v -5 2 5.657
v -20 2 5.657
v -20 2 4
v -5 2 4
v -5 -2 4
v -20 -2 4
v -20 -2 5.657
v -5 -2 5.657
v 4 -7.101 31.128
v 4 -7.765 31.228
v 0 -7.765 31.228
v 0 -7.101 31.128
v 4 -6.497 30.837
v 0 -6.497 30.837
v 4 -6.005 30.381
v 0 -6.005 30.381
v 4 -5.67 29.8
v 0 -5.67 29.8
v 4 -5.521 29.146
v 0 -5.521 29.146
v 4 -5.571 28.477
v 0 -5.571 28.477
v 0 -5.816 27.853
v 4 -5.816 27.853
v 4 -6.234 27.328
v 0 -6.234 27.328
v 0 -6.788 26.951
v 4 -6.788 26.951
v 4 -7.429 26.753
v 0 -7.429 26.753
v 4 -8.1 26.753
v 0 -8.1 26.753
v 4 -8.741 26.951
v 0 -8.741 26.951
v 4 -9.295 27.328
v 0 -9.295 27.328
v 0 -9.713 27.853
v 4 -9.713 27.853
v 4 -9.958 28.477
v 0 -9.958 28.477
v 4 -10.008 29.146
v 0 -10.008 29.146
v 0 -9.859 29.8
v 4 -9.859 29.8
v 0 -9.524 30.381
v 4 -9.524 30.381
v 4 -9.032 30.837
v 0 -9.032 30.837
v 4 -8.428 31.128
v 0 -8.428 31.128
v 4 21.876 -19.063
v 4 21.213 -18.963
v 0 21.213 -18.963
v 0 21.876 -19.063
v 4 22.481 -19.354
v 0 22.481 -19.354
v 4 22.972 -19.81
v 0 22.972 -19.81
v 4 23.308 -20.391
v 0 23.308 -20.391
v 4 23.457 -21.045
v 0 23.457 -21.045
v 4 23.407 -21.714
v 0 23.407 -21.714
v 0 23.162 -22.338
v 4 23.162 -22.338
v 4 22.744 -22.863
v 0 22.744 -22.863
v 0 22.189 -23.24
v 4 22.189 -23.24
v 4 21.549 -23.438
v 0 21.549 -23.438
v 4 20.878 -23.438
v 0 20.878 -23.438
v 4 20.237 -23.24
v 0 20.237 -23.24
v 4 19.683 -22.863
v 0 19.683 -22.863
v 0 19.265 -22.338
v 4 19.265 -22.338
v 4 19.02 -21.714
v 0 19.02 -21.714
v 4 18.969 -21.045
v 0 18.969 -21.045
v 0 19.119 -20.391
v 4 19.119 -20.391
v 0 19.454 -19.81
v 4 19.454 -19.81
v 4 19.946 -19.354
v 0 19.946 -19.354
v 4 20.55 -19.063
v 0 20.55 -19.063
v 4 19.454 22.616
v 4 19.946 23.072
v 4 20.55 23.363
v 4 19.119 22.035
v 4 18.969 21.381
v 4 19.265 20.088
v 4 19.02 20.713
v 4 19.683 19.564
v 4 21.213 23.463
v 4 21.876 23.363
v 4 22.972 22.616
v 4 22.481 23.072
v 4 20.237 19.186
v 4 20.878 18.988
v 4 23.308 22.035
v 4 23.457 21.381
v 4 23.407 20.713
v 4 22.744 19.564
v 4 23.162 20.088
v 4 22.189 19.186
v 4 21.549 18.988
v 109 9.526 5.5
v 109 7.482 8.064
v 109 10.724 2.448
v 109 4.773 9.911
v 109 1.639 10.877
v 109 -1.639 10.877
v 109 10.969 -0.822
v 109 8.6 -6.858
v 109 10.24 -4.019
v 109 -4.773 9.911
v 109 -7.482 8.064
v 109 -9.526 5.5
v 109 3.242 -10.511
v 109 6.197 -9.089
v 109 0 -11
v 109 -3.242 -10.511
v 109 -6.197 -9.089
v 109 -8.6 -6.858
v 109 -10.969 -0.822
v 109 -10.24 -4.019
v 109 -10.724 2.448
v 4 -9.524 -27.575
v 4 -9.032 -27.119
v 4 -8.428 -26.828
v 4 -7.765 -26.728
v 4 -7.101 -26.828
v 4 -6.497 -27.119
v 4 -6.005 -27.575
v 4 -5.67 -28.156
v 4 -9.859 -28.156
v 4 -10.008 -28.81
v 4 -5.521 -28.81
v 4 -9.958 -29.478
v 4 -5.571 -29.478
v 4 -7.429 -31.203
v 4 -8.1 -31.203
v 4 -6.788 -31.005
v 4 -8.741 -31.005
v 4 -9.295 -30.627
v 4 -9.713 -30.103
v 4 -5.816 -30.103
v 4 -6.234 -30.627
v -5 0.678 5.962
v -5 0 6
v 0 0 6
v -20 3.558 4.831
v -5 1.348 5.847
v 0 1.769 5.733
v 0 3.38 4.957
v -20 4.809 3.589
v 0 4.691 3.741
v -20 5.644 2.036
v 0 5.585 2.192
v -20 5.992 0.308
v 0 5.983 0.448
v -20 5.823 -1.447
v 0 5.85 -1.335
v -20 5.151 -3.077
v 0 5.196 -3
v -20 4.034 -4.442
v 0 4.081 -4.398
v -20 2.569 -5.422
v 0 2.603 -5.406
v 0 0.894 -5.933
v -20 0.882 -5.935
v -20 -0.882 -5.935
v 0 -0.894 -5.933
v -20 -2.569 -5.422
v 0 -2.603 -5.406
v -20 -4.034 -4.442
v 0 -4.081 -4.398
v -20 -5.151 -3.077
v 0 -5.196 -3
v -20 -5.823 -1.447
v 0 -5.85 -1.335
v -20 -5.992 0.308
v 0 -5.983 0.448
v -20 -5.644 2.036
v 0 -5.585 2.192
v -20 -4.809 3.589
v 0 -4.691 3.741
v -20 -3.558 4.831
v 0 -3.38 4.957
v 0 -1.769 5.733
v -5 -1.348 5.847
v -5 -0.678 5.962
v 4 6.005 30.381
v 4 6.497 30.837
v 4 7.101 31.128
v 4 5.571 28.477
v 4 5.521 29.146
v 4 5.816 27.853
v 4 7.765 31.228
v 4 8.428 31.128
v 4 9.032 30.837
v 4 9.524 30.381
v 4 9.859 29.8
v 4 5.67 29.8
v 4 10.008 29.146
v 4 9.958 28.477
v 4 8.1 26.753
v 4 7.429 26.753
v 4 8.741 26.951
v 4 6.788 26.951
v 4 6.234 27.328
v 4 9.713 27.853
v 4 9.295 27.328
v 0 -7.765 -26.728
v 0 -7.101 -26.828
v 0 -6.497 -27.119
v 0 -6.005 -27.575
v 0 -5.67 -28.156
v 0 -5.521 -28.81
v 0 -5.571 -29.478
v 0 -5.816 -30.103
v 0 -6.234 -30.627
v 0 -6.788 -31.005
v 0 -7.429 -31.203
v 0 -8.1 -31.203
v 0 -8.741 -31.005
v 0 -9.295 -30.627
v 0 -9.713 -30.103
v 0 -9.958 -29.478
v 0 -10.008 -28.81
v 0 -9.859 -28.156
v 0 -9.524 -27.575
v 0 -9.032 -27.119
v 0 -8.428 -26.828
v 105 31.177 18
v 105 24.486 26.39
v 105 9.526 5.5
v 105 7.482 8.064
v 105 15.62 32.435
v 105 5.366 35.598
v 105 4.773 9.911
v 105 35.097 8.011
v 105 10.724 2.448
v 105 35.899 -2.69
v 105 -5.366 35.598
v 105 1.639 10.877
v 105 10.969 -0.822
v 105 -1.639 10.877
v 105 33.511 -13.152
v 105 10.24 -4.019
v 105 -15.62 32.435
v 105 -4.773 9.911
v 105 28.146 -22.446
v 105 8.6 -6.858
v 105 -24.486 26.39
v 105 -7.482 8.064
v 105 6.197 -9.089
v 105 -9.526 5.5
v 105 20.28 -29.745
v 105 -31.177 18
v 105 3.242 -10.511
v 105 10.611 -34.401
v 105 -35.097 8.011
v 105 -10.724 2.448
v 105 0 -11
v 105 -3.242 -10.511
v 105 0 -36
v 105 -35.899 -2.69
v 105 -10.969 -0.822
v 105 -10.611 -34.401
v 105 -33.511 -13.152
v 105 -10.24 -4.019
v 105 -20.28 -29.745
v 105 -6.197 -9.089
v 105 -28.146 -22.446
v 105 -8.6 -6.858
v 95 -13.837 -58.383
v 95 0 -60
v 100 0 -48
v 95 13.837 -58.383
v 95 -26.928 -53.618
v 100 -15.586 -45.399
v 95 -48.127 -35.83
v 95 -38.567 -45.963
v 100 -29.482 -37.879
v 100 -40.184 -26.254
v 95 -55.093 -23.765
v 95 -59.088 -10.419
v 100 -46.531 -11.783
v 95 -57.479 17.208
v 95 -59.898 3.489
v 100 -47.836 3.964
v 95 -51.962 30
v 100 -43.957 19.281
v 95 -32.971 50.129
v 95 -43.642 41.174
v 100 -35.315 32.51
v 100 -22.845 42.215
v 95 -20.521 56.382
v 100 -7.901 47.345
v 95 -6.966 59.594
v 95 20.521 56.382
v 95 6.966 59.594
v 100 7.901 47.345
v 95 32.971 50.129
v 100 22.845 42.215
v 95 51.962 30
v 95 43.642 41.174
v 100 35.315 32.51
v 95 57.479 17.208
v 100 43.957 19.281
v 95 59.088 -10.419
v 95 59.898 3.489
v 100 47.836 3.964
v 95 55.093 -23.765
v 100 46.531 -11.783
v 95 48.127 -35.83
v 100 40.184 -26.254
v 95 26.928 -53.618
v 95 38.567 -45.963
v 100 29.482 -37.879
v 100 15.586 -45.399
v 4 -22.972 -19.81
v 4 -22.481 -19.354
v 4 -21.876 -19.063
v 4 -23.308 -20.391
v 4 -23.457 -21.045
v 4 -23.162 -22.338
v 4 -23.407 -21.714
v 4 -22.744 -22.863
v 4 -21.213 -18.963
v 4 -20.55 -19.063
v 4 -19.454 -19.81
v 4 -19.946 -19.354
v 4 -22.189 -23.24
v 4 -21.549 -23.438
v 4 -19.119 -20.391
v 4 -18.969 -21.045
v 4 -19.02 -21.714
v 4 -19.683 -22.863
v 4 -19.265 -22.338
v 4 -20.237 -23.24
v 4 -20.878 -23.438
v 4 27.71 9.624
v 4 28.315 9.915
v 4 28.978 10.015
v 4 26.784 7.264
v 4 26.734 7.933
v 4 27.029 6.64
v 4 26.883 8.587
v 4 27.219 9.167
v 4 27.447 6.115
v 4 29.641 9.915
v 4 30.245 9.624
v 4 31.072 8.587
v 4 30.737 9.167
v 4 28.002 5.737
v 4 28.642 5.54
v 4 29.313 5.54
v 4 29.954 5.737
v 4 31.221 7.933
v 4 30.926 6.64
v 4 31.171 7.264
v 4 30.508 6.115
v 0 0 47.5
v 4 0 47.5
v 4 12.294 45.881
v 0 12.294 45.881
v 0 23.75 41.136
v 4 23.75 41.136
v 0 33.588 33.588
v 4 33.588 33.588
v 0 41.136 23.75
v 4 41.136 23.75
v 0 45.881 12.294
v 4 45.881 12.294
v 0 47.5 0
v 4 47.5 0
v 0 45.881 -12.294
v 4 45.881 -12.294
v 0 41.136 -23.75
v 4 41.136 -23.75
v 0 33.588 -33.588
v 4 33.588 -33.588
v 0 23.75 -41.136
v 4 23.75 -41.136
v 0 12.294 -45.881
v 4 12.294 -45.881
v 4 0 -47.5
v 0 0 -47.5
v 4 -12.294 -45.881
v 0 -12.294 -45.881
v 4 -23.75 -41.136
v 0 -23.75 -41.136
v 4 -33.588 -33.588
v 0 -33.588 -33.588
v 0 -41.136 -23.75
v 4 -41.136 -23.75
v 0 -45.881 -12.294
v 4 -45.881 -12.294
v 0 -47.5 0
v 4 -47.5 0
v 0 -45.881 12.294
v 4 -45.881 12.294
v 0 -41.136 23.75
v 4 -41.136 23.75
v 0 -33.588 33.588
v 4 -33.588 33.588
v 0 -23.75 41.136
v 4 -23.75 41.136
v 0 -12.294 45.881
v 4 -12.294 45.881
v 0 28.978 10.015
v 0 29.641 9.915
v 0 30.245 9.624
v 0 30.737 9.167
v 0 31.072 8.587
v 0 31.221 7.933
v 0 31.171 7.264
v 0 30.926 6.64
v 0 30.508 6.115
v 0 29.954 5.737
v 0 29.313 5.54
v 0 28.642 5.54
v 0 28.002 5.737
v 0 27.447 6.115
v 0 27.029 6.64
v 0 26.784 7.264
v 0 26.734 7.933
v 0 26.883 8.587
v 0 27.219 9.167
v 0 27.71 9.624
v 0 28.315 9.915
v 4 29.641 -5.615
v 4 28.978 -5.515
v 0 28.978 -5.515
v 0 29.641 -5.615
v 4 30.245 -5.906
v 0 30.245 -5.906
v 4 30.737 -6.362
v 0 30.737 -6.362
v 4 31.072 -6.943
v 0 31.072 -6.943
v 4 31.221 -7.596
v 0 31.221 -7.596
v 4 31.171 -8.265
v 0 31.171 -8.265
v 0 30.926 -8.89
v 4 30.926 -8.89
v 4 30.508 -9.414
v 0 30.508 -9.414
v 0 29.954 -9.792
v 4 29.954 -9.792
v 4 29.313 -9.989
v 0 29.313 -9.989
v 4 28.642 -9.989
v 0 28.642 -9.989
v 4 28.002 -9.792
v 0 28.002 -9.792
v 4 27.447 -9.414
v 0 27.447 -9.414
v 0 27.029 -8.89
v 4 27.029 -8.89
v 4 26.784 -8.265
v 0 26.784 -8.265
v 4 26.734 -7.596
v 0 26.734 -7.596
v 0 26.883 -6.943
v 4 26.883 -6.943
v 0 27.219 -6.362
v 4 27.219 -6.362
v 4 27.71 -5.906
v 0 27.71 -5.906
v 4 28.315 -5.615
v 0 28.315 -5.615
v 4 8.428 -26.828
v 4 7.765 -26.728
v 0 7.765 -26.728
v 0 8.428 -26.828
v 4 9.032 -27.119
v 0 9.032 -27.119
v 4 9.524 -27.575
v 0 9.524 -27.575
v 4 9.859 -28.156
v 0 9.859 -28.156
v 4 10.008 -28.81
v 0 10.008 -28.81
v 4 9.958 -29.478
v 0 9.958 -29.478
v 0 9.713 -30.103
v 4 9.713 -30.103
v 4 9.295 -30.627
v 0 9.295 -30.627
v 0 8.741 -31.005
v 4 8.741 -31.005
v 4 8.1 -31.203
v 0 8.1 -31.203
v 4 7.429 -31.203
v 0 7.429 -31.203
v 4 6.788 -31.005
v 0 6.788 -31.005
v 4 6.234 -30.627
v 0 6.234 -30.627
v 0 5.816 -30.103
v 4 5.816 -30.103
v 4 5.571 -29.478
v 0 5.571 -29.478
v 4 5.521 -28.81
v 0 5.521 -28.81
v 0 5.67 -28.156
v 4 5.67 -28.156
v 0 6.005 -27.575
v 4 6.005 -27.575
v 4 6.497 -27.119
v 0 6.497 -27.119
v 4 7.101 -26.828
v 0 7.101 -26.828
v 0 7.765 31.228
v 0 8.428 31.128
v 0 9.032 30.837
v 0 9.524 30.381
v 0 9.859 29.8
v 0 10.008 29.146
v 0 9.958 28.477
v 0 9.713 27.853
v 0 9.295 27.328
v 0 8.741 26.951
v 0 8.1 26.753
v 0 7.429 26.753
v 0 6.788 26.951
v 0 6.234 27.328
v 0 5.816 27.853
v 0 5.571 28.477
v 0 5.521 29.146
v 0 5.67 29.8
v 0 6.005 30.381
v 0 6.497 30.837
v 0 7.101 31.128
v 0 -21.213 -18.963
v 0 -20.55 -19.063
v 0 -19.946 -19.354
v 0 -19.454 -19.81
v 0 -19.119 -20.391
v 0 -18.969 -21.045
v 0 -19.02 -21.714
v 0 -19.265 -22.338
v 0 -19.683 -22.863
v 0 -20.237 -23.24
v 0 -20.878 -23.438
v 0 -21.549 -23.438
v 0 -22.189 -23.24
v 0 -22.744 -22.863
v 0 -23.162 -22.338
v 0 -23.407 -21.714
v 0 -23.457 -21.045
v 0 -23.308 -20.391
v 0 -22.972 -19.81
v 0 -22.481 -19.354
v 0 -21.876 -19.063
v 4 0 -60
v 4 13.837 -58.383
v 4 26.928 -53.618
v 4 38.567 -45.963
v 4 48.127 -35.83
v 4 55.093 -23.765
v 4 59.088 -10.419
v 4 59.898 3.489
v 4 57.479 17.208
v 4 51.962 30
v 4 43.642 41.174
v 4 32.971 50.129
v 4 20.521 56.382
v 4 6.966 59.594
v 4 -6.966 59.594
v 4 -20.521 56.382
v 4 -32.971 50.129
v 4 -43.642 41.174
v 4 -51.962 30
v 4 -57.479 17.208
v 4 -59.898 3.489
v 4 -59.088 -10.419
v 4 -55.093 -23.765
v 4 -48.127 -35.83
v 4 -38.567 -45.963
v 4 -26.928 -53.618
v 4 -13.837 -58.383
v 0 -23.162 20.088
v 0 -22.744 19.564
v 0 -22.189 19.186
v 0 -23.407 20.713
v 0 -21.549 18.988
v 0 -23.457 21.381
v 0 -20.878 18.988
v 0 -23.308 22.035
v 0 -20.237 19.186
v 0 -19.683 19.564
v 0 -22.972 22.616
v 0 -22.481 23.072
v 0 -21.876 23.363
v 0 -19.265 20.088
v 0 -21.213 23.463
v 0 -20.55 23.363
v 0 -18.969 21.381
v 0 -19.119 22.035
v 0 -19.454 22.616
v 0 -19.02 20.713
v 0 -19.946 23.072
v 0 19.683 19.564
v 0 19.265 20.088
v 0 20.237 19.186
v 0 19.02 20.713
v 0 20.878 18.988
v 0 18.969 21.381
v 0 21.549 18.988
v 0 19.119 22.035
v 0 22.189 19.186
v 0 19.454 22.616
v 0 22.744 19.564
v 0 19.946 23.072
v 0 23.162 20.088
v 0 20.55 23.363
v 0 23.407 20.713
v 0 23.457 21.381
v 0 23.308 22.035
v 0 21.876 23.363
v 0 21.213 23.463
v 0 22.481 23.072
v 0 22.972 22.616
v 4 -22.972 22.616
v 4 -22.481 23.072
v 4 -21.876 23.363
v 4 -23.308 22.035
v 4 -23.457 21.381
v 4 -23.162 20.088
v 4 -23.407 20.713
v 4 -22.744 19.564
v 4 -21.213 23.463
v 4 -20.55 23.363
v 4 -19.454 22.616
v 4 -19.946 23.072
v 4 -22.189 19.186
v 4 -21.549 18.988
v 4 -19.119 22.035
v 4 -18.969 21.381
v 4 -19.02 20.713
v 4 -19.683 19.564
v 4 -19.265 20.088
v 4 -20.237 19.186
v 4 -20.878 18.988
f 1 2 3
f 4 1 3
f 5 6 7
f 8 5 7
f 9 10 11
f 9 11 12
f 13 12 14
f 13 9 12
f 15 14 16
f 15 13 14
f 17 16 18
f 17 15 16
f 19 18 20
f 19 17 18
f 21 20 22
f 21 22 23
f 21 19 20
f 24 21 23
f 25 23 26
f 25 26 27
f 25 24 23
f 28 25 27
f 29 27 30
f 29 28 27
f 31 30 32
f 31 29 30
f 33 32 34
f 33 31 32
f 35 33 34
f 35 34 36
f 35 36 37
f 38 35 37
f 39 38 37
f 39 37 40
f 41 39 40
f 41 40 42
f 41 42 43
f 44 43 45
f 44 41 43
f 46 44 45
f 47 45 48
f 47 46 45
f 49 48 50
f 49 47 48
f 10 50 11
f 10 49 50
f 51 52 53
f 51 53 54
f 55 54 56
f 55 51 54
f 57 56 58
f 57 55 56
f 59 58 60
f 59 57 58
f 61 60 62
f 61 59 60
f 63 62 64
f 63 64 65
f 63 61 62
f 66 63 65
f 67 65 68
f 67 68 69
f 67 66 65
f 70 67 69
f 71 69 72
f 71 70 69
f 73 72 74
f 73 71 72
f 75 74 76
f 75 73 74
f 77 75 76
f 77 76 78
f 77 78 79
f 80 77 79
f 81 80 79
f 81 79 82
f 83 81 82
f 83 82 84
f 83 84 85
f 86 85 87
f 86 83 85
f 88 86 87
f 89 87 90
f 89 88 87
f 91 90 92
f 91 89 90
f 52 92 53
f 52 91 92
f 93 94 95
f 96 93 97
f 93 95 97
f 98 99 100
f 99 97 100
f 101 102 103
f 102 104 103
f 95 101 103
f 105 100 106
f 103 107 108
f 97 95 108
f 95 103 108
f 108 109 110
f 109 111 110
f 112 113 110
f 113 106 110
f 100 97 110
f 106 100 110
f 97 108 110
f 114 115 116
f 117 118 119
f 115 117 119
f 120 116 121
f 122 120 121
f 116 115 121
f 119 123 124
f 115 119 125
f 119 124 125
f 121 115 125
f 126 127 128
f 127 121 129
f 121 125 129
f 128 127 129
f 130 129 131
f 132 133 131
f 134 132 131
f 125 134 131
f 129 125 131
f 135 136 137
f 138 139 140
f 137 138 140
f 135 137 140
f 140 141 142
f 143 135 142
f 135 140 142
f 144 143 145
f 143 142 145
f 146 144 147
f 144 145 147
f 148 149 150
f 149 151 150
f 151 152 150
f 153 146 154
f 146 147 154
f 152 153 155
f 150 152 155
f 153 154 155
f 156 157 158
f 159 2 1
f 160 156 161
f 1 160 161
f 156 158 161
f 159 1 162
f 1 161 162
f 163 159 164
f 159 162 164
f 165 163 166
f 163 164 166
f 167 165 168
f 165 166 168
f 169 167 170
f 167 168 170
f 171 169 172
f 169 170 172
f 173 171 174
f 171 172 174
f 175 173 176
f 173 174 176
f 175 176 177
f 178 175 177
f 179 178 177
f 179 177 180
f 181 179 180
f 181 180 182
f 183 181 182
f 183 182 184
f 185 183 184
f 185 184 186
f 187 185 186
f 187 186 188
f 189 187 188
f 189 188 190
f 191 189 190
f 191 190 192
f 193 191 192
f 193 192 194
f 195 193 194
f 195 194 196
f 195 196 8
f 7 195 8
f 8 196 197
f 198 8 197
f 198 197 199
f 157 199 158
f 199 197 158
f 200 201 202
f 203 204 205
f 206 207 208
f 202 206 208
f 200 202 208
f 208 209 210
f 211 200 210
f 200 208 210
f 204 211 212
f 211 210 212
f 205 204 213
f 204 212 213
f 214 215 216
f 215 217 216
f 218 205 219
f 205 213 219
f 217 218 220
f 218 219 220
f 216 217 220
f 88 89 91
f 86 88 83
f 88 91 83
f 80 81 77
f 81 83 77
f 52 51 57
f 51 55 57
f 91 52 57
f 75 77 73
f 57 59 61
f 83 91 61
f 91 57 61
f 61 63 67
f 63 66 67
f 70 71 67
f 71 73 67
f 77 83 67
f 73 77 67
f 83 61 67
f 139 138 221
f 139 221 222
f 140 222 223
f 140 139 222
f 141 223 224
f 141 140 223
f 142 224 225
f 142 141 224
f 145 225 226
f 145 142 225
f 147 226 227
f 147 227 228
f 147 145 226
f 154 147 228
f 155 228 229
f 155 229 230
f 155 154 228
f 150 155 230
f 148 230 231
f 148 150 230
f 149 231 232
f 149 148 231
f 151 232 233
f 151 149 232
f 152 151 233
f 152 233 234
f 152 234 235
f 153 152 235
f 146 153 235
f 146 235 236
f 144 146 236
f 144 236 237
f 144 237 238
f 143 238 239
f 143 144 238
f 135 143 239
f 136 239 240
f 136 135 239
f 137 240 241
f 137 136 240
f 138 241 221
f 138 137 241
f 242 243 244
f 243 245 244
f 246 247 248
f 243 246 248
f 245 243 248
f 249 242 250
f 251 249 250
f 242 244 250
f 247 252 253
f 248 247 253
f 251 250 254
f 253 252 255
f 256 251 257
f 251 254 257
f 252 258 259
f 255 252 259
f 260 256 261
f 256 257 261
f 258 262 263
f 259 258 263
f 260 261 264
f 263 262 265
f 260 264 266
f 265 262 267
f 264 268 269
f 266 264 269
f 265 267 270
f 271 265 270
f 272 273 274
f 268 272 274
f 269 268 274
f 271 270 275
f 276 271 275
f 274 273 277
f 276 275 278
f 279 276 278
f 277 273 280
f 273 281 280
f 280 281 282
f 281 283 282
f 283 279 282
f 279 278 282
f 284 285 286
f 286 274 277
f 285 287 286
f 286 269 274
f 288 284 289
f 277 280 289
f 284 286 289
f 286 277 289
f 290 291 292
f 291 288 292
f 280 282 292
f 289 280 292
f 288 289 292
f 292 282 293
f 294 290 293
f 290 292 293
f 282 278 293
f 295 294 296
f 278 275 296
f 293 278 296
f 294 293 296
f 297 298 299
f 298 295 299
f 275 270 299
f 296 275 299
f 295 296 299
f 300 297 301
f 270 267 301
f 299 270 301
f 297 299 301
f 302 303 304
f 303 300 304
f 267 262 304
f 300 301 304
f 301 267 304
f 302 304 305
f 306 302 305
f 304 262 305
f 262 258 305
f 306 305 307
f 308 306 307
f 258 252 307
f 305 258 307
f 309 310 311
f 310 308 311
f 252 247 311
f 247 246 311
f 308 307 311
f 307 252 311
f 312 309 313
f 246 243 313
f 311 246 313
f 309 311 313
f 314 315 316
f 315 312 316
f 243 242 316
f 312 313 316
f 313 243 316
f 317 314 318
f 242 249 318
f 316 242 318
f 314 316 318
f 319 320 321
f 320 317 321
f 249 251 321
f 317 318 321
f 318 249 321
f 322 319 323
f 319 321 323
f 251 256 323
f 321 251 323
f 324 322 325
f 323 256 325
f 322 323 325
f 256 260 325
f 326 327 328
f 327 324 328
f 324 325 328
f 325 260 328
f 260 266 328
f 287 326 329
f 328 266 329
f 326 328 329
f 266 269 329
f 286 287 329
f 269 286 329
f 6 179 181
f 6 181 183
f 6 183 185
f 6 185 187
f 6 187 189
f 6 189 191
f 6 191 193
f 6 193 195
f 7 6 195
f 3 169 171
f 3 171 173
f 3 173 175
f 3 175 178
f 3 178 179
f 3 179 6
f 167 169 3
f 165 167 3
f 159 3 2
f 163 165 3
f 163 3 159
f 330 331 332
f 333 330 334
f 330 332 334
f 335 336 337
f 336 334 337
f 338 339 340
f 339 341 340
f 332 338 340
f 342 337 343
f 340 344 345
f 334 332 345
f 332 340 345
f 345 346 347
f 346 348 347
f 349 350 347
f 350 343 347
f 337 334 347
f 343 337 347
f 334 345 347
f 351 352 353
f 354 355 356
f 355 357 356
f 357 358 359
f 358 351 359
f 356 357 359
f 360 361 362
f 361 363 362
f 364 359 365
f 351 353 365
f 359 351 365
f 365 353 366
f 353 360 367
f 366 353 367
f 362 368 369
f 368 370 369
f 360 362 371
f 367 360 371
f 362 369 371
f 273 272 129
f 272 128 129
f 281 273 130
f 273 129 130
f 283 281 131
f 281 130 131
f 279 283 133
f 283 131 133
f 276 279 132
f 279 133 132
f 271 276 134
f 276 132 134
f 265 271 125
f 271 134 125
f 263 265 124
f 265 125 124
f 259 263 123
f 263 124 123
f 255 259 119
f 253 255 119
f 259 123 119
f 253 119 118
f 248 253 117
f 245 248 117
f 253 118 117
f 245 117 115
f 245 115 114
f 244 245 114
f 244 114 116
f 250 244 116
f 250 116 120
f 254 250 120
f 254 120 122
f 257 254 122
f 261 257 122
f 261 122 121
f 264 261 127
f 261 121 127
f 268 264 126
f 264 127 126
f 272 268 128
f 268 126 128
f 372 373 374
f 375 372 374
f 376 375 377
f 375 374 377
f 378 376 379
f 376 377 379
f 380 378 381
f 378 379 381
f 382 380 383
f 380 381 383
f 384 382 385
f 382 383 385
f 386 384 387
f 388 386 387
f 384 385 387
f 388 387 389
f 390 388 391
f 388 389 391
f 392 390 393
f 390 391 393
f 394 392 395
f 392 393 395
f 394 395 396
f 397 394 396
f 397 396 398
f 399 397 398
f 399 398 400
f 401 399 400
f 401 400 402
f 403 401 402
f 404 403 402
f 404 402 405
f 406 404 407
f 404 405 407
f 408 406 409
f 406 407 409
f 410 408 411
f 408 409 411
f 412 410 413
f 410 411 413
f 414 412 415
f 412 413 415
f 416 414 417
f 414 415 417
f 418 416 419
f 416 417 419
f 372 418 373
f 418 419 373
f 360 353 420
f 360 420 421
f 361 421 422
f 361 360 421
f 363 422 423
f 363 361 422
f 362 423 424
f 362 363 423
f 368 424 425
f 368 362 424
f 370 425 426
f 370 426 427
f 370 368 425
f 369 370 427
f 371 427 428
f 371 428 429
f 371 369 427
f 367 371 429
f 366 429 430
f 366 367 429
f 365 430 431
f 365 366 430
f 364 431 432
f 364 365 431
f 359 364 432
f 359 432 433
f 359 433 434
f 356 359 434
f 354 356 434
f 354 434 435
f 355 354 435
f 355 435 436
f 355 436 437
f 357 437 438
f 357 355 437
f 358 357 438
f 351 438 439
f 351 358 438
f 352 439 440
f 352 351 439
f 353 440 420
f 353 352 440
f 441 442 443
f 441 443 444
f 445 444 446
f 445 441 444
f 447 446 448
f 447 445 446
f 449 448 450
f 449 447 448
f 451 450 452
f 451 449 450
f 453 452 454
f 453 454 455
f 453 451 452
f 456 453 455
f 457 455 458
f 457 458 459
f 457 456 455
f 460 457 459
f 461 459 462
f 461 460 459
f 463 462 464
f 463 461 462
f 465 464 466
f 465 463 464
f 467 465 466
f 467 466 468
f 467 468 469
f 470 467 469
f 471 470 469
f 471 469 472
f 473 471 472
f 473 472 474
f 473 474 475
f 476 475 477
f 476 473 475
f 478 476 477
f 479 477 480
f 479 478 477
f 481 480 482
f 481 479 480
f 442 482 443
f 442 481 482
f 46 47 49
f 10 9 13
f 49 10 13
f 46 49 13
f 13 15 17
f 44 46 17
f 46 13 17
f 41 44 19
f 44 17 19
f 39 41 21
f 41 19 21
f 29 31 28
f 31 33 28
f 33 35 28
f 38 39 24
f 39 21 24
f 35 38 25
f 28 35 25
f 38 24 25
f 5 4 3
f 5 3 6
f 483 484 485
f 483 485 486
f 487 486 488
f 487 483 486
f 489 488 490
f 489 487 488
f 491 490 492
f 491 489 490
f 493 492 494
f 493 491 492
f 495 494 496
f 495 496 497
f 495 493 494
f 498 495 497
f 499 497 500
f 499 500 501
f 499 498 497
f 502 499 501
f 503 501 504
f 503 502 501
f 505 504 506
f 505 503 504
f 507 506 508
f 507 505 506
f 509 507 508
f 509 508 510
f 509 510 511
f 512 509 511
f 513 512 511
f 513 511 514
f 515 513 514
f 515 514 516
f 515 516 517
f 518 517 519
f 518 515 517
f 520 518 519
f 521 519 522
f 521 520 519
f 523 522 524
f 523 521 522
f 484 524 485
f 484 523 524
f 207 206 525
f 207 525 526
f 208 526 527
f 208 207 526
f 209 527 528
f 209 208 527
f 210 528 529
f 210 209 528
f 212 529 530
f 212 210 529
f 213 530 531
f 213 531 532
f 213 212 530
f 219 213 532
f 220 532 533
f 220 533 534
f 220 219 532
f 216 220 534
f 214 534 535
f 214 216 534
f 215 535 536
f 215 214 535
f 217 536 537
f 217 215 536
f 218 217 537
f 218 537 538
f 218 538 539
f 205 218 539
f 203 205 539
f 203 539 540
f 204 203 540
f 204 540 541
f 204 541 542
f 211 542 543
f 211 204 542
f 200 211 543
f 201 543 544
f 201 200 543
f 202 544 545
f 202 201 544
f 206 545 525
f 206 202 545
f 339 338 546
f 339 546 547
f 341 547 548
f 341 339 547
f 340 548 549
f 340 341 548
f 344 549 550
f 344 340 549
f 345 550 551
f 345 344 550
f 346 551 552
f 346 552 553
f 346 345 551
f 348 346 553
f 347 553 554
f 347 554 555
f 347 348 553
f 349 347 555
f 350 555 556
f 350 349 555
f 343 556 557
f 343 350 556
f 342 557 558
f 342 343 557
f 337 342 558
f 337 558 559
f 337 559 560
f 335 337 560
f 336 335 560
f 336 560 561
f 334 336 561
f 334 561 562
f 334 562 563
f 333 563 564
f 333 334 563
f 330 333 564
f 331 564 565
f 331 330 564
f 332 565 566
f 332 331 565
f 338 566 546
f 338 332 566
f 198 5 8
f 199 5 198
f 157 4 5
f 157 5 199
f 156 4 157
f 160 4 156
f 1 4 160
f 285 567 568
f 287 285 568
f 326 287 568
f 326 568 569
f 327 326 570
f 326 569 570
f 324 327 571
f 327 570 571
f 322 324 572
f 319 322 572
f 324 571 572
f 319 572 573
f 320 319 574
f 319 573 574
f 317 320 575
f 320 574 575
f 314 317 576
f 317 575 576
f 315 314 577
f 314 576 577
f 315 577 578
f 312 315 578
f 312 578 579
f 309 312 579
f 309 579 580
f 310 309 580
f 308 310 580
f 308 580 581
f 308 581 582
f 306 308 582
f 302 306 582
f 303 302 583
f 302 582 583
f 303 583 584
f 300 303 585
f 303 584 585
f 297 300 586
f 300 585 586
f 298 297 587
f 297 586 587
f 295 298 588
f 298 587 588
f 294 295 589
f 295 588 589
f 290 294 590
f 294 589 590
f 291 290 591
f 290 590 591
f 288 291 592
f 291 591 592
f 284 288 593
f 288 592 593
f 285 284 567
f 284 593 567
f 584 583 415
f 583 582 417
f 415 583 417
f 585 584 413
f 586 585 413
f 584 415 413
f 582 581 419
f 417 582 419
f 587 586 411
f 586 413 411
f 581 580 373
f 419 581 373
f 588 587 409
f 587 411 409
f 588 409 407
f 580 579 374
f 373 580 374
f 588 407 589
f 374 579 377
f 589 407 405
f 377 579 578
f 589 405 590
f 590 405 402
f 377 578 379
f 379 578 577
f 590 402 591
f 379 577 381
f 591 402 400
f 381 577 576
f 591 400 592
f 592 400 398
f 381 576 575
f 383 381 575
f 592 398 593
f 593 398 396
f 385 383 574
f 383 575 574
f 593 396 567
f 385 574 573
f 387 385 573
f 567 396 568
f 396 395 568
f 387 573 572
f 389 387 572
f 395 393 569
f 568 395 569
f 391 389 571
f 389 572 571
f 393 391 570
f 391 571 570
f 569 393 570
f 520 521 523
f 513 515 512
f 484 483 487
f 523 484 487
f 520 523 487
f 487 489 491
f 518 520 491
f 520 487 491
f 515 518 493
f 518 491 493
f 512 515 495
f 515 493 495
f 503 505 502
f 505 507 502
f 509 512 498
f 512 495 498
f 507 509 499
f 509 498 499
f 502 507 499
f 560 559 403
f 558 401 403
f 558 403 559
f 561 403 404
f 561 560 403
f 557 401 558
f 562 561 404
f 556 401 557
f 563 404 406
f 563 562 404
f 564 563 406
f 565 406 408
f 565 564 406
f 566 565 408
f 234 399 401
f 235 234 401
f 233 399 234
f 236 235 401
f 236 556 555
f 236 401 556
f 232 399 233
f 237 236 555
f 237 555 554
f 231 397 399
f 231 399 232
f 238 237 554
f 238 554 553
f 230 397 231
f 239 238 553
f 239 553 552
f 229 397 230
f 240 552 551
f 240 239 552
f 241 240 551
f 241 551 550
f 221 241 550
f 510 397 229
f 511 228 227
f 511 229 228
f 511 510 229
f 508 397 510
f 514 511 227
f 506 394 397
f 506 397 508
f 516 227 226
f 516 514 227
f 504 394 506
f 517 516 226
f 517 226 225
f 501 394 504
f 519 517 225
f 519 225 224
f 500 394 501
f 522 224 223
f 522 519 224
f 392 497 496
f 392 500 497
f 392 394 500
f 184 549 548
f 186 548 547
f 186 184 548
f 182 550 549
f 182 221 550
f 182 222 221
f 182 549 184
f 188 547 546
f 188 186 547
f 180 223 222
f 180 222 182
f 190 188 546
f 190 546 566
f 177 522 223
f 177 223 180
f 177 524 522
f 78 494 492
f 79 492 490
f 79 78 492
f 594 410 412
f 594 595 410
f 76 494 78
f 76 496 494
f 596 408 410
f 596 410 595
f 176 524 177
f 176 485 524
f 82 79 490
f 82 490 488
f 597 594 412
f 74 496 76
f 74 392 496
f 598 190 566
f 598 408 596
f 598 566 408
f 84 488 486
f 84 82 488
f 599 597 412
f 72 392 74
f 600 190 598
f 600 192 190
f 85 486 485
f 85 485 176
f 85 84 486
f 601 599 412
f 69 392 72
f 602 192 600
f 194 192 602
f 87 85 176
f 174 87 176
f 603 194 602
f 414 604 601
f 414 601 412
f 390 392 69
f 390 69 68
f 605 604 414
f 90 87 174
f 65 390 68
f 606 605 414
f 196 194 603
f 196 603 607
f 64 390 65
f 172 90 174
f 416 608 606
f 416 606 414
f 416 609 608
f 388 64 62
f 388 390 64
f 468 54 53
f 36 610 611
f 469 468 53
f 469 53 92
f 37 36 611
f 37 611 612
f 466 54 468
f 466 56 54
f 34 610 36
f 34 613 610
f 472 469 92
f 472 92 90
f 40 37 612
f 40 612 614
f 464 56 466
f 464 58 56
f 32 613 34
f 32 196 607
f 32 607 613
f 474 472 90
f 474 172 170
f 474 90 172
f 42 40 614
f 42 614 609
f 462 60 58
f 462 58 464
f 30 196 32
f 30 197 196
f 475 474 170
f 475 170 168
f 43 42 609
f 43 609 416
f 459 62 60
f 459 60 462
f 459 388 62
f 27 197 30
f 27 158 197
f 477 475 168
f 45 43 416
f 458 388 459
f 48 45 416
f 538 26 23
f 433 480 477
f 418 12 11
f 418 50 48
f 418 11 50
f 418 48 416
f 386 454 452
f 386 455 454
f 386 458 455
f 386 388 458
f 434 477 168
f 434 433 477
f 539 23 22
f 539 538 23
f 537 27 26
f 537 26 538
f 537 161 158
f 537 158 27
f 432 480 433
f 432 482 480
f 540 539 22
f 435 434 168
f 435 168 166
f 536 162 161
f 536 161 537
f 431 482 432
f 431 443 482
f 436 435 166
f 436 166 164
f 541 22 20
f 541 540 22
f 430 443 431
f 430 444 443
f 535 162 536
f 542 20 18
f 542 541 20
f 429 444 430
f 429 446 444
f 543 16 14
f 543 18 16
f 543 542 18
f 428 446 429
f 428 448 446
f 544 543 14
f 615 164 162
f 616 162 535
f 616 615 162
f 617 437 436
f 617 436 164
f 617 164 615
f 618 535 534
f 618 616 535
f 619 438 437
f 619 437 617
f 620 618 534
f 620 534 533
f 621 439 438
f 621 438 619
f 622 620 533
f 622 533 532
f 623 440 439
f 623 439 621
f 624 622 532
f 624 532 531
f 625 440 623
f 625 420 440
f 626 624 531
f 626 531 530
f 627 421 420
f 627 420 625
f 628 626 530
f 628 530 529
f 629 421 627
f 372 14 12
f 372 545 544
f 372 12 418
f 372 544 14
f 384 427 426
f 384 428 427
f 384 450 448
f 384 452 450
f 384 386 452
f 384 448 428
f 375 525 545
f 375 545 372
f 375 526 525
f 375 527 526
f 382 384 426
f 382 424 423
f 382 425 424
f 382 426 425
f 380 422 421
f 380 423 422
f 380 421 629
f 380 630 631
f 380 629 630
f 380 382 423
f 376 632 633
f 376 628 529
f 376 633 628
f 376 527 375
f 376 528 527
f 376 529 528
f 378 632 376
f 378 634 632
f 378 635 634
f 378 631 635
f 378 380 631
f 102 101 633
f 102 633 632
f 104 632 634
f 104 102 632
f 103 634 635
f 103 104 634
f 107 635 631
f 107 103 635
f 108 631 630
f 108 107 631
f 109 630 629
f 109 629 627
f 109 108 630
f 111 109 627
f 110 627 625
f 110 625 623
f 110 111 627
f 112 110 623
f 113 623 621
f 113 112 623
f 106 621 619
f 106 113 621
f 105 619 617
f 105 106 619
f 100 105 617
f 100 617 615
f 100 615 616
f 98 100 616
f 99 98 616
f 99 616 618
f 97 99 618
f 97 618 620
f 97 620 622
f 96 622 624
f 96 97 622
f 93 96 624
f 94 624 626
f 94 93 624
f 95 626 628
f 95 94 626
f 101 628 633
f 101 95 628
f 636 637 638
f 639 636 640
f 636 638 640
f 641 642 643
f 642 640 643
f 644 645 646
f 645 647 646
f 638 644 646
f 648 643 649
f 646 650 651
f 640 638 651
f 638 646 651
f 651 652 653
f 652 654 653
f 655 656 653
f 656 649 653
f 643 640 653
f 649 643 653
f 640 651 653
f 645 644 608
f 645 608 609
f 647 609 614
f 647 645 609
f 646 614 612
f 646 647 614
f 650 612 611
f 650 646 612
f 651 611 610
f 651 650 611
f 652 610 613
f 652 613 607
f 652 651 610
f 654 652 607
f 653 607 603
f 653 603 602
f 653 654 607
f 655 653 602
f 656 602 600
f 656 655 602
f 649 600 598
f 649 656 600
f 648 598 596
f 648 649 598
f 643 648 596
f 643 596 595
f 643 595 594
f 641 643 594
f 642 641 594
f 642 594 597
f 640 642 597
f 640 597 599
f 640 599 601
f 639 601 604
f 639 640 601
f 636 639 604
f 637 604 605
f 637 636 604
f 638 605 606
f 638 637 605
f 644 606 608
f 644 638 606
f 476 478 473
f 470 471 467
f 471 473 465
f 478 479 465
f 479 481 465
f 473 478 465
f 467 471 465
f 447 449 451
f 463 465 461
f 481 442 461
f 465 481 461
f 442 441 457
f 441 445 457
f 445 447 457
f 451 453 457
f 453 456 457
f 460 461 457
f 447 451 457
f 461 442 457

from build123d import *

# Parameters (mm, degrees)
BOSS_EXTRUDE1_START = 4
SKETCH1_R           = 60
BOSS_EXTRUDE1_DEPTH = 91
SKETCH3_R           = 47.5
SKETCH3_R_2         = 2.25
BOSS_EXTRUDE2_DEPTH = 4
SKETCH4_R           = 6
BOSS_EXTRUDE3_DEPTH = 20
CUT_EXTRUDE1_START  = -15
CUT_EXTRUDE1_DEPTH  = 15


with BuildPart() as part:
    # Sketch1 → Boss-Extrude1 (new body)
    with BuildSketch(Plane(origin=(0, 0, 0), x_dir=(0, 0, -1), z_dir=(1, 0, 0)).offset(BOSS_EXTRUDE1_START)):
        Circle(SKETCH1_R)
    extrude(amount=BOSS_EXTRUDE1_DEPTH)

    # Sketch2 → Revolve1 (revolve)
    with BuildSketch(Plane.XY):
        Polygon((95, 60), (105, 36), (105, 11), (109, 11), (109, 0), (105, 0), (95, 0), align=None)
    revolve(axis=Axis((95, 0, 0), (-1, 0, 0)))

    # Sketch3 → Boss-Extrude2 (add)
    with BuildSketch(Plane.ZY.offset(-4)):
        Circle(SKETCH3_R)
        with Locations((21.213203436, -21.213203436)):
            Circle(SKETCH3_R_2, mode=Mode.SUBTRACT)
        with Locations((-21.213203436, -21.213203436)):
            Circle(SKETCH3_R_2, mode=Mode.SUBTRACT)
        with Locations((-28.977774789, -7.764571353)):
            Circle(SKETCH3_R_2, mode=Mode.SUBTRACT)
        with Locations((-28.977774789, 7.764571353)):
            Circle(SKETCH3_R_2, mode=Mode.SUBTRACT)
        with Locations((-21.213203436, 21.213203436)):
            Circle(SKETCH3_R_2, mode=Mode.SUBTRACT)
        with Locations((-7.764571353, 28.977774789)):
            Circle(SKETCH3_R_2, mode=Mode.SUBTRACT)
        with Locations((7.764571353, 28.977774789)):
            Circle(SKETCH3_R_2, mode=Mode.SUBTRACT)
        with Locations((21.213203436, 21.213203436)):
            Circle(SKETCH3_R_2, mode=Mode.SUBTRACT)
        with Locations((28.977774789, 7.764571353)):
            Circle(SKETCH3_R_2, mode=Mode.SUBTRACT)
        with Locations((28.977774789, -7.764571353)):
            Circle(SKETCH3_R_2, mode=Mode.SUBTRACT)
    extrude(amount=BOSS_EXTRUDE2_DEPTH)

    # Sketch4 → Boss-Extrude3 (add)
    with BuildSketch(Plane.ZY):
        Circle(SKETCH4_R)
    extrude(amount=BOSS_EXTRUDE3_DEPTH)

    # Sketch5 → Cut-Extrude1 (cut)
    with BuildSketch(Plane.ZY.offset(20).offset(CUT_EXTRUDE1_START)):
        with BuildLine():
            Line((5.656854249, 2), (4, 2))
            Line((4, 2), (4, -2))
            Line((4, -2), (5.656854249, -2))
            ThreePointArc((5.656854249, -2), (6, 0), (5.656854249, 2))
        make_face()
    extrude(amount=CUT_EXTRUDE1_DEPTH, mode=Mode.SUBTRACT)


solid = part.part
